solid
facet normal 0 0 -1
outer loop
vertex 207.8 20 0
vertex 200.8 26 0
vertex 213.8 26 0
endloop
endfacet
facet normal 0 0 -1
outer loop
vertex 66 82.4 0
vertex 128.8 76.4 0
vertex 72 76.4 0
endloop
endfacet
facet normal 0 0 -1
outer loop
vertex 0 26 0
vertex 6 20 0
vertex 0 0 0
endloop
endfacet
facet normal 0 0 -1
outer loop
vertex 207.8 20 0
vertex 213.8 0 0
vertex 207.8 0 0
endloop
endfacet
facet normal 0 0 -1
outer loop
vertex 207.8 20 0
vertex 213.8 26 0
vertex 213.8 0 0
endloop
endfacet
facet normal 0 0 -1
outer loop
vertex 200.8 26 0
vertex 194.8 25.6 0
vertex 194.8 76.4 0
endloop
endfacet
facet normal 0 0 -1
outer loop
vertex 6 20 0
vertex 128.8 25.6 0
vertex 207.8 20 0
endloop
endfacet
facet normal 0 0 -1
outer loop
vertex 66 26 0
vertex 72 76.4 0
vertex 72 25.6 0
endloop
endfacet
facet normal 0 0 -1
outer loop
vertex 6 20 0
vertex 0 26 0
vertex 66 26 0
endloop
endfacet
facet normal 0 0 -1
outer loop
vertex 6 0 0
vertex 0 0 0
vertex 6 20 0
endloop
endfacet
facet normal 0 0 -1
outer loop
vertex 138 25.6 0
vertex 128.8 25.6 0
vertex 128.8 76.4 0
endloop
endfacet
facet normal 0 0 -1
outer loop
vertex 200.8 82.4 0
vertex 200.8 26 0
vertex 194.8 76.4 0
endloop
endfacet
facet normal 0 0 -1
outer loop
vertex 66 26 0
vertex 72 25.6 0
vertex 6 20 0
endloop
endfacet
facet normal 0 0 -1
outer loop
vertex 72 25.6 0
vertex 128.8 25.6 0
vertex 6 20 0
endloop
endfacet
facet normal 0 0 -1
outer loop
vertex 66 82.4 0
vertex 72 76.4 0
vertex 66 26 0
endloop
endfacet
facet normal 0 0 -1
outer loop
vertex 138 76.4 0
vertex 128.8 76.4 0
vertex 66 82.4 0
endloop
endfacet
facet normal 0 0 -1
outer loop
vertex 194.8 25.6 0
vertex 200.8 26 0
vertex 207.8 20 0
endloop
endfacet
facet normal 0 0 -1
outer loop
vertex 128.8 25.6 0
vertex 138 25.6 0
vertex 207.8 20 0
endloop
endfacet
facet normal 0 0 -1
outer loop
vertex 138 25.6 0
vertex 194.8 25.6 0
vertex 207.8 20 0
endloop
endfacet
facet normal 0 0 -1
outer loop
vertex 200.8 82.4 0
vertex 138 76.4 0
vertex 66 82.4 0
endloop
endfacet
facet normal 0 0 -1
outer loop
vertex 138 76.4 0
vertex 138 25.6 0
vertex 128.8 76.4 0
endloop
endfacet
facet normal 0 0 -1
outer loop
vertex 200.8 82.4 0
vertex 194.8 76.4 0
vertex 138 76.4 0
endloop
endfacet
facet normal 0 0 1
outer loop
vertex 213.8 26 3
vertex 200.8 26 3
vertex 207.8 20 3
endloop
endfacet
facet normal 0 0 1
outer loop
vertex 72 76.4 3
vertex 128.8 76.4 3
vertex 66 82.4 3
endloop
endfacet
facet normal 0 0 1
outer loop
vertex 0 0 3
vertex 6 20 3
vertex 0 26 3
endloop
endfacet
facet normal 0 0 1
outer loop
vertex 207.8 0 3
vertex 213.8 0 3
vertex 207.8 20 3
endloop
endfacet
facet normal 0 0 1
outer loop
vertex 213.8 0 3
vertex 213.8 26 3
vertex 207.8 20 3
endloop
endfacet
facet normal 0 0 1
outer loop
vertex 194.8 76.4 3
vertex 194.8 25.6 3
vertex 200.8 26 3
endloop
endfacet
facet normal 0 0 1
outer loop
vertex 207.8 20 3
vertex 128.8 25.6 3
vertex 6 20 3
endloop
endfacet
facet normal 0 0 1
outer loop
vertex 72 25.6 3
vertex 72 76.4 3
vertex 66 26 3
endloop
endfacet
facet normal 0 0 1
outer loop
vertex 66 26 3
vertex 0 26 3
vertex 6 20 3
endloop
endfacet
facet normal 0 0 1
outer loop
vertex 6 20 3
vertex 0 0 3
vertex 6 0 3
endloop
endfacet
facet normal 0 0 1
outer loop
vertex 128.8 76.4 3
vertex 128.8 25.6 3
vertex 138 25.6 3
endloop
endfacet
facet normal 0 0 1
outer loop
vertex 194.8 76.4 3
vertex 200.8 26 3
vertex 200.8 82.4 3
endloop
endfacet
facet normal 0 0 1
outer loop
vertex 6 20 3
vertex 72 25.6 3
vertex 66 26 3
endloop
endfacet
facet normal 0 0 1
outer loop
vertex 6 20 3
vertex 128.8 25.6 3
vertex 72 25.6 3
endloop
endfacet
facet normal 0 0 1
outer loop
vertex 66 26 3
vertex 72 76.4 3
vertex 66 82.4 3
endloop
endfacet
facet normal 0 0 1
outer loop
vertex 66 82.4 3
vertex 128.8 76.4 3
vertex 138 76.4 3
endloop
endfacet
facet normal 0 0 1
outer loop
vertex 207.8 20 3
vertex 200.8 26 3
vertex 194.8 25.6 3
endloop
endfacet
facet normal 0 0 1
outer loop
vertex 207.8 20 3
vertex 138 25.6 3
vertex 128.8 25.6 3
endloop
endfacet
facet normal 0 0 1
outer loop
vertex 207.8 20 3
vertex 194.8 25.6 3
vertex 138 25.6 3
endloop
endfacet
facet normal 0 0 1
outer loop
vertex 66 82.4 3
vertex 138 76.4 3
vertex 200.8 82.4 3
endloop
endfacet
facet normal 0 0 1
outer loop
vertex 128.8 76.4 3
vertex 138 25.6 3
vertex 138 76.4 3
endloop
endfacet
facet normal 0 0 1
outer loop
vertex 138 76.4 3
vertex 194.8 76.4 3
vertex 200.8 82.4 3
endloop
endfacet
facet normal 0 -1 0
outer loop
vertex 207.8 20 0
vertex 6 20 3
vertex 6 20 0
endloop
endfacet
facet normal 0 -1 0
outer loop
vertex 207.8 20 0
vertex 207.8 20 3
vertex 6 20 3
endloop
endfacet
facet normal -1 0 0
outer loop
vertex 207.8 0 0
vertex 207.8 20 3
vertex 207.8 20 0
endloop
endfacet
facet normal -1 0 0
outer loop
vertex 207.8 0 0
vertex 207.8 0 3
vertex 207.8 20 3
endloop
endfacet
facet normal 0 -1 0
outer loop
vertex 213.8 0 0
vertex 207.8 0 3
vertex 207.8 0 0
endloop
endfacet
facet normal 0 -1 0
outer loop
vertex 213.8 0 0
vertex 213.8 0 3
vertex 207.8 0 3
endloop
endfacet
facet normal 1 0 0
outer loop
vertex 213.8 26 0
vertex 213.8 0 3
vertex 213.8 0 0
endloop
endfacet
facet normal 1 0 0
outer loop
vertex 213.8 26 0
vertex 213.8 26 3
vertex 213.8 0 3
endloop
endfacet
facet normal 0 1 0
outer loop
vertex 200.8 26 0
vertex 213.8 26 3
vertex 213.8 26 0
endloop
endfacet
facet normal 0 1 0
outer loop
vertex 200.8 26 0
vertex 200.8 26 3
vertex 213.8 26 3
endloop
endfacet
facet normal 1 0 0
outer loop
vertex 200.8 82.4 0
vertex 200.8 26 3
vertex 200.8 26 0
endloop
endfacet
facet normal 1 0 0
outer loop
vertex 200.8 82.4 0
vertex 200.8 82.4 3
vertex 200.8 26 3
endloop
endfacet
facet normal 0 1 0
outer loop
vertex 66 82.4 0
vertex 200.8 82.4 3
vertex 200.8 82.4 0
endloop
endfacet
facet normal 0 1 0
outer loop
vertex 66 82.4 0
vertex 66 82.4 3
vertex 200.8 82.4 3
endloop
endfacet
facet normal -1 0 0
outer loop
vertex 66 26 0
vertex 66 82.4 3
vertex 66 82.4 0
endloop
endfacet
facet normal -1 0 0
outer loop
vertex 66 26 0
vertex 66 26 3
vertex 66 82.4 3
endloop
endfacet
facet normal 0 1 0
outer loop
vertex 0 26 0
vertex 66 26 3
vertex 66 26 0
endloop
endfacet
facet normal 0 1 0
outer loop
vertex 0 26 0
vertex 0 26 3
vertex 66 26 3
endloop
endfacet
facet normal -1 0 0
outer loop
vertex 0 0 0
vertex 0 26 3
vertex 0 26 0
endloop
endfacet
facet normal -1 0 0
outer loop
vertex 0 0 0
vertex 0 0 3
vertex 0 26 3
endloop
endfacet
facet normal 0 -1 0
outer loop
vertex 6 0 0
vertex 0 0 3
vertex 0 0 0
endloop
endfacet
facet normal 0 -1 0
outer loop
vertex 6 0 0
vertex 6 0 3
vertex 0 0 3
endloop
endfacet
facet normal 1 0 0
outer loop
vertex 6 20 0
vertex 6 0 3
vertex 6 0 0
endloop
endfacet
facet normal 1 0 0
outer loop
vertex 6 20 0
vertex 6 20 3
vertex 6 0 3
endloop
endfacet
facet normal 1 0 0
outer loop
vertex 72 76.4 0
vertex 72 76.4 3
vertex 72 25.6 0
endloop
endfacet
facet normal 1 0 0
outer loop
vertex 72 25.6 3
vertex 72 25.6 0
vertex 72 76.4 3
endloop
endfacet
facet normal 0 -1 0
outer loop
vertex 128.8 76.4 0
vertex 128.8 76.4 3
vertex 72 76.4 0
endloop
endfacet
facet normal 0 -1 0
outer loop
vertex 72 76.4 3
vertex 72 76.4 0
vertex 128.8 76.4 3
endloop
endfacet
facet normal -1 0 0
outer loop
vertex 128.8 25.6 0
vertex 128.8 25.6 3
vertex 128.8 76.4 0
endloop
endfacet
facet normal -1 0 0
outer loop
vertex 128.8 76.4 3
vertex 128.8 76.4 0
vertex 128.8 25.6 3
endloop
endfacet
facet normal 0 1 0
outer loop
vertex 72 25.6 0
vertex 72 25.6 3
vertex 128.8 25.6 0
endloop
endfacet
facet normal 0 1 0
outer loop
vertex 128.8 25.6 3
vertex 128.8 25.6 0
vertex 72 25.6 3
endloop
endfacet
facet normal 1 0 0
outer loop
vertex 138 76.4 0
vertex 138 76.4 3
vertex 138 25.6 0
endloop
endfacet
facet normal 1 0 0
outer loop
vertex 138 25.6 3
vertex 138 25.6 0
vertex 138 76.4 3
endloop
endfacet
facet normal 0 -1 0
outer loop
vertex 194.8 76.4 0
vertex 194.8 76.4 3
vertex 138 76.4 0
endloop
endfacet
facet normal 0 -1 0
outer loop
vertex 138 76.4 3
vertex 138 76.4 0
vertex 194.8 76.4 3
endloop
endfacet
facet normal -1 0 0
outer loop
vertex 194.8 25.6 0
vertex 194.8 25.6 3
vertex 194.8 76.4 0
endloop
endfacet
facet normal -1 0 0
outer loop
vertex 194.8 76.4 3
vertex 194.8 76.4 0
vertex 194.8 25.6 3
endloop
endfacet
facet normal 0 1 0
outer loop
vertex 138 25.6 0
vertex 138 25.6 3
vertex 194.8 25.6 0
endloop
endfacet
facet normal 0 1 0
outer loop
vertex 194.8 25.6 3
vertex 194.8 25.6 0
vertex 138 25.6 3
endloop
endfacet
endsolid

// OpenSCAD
// file: ../tower_jig.scad
// ============================================================
//  Tower placement jig: a flat plate laid on the plywood. Its front
//  strip butts against the X base's back edge (setting the 6 mm gap),
//  two arms hug the X base's back corners (setting X), and two pockets
//  hold the bare stage bases of port towers A and B. Screw the bases
//  down, lift the jig off, then build the stages on them.
//  World coords (same as assembly.scad).
// ============================================================
include <axes.scad>

jig_t     = 3;     // plate thickness (well under the 6 mm stage base)
jig_clr   = 0.4;   // per side, pockets and arms
jig_wall  = 6;     // material around each pocket
jig_arm_w = 6;     // arm width (X) beside the X base ends
jig_arm_l = 20;    // arm length (-Y) along the X base ends

function jig_pocket(i) = [tower_x(i) - stage_L / 2 - jig_clr, tower_y - stage_D / 2 - jig_clr,
                          stage_L + 2 * jig_clr, stage_D + 2 * jig_clr];   // x, y, w, d

module tower_jig_2d() {
    ax0 = xb_x0 - jig_clr - jig_arm_w;
    ax1 = xb_x1 + jig_clr + jig_arm_w;
    back = tower_y + stage_D / 2 + jig_clr + jig_wall;
    difference() {
        union() {
            // front strip (fills the gap to the towers) + band around the pockets
            translate([ax0, xb_y1]) square([ax1 - ax0, tower_y - stage_D / 2 - jig_clr - xb_y1]);
            for (i = [0, 1]) let (p = jig_pocket(i))
                translate([p[0] - jig_wall, xb_y1]) square([p[2] + 2 * jig_wall, back - xb_y1]);
            // corner arms along the X base's left and right ends
            for (x = [ax0, xb_x1 + jig_clr]) translate([x, xb_y1 - jig_arm_l]) square([jig_arm_w, jig_arm_l + 0.01]);
            // tie the arms to the strip at full width
            translate([ax0, xb_y1]) square([ax1 - ax0, jig_wall]);
        }
        for (i = [0, 1]) let (p = jig_pocket(i)) translate([p[0], p[1]]) square([p[2], p[3]]);
    }
}

module tower_jig_world() { linear_extrude(jig_t) tower_jig_2d(); }

// front strip width between the X base and the pockets
echo("CHECK", "jig_strip_w", tower_y - stage_D / 2 - jig_clr - xb_y1);
// main file
// Tower placement jig. Qty 1. Print flat as exported, no supports.
// Use: screw the X base down, butt the jig's straight edge against the
// X base's back edge with its arms around the back corners, drop the
// two bare stage bases into the pockets (tower B = mirrored base on the
// right), screw them down, lift the jig off.
include <../tower_jig.scad>
translate([-(xb_x0 - jig_clr - jig_arm_w), -(xb_y1 - jig_arm_l), 0]) tower_jig_world();
